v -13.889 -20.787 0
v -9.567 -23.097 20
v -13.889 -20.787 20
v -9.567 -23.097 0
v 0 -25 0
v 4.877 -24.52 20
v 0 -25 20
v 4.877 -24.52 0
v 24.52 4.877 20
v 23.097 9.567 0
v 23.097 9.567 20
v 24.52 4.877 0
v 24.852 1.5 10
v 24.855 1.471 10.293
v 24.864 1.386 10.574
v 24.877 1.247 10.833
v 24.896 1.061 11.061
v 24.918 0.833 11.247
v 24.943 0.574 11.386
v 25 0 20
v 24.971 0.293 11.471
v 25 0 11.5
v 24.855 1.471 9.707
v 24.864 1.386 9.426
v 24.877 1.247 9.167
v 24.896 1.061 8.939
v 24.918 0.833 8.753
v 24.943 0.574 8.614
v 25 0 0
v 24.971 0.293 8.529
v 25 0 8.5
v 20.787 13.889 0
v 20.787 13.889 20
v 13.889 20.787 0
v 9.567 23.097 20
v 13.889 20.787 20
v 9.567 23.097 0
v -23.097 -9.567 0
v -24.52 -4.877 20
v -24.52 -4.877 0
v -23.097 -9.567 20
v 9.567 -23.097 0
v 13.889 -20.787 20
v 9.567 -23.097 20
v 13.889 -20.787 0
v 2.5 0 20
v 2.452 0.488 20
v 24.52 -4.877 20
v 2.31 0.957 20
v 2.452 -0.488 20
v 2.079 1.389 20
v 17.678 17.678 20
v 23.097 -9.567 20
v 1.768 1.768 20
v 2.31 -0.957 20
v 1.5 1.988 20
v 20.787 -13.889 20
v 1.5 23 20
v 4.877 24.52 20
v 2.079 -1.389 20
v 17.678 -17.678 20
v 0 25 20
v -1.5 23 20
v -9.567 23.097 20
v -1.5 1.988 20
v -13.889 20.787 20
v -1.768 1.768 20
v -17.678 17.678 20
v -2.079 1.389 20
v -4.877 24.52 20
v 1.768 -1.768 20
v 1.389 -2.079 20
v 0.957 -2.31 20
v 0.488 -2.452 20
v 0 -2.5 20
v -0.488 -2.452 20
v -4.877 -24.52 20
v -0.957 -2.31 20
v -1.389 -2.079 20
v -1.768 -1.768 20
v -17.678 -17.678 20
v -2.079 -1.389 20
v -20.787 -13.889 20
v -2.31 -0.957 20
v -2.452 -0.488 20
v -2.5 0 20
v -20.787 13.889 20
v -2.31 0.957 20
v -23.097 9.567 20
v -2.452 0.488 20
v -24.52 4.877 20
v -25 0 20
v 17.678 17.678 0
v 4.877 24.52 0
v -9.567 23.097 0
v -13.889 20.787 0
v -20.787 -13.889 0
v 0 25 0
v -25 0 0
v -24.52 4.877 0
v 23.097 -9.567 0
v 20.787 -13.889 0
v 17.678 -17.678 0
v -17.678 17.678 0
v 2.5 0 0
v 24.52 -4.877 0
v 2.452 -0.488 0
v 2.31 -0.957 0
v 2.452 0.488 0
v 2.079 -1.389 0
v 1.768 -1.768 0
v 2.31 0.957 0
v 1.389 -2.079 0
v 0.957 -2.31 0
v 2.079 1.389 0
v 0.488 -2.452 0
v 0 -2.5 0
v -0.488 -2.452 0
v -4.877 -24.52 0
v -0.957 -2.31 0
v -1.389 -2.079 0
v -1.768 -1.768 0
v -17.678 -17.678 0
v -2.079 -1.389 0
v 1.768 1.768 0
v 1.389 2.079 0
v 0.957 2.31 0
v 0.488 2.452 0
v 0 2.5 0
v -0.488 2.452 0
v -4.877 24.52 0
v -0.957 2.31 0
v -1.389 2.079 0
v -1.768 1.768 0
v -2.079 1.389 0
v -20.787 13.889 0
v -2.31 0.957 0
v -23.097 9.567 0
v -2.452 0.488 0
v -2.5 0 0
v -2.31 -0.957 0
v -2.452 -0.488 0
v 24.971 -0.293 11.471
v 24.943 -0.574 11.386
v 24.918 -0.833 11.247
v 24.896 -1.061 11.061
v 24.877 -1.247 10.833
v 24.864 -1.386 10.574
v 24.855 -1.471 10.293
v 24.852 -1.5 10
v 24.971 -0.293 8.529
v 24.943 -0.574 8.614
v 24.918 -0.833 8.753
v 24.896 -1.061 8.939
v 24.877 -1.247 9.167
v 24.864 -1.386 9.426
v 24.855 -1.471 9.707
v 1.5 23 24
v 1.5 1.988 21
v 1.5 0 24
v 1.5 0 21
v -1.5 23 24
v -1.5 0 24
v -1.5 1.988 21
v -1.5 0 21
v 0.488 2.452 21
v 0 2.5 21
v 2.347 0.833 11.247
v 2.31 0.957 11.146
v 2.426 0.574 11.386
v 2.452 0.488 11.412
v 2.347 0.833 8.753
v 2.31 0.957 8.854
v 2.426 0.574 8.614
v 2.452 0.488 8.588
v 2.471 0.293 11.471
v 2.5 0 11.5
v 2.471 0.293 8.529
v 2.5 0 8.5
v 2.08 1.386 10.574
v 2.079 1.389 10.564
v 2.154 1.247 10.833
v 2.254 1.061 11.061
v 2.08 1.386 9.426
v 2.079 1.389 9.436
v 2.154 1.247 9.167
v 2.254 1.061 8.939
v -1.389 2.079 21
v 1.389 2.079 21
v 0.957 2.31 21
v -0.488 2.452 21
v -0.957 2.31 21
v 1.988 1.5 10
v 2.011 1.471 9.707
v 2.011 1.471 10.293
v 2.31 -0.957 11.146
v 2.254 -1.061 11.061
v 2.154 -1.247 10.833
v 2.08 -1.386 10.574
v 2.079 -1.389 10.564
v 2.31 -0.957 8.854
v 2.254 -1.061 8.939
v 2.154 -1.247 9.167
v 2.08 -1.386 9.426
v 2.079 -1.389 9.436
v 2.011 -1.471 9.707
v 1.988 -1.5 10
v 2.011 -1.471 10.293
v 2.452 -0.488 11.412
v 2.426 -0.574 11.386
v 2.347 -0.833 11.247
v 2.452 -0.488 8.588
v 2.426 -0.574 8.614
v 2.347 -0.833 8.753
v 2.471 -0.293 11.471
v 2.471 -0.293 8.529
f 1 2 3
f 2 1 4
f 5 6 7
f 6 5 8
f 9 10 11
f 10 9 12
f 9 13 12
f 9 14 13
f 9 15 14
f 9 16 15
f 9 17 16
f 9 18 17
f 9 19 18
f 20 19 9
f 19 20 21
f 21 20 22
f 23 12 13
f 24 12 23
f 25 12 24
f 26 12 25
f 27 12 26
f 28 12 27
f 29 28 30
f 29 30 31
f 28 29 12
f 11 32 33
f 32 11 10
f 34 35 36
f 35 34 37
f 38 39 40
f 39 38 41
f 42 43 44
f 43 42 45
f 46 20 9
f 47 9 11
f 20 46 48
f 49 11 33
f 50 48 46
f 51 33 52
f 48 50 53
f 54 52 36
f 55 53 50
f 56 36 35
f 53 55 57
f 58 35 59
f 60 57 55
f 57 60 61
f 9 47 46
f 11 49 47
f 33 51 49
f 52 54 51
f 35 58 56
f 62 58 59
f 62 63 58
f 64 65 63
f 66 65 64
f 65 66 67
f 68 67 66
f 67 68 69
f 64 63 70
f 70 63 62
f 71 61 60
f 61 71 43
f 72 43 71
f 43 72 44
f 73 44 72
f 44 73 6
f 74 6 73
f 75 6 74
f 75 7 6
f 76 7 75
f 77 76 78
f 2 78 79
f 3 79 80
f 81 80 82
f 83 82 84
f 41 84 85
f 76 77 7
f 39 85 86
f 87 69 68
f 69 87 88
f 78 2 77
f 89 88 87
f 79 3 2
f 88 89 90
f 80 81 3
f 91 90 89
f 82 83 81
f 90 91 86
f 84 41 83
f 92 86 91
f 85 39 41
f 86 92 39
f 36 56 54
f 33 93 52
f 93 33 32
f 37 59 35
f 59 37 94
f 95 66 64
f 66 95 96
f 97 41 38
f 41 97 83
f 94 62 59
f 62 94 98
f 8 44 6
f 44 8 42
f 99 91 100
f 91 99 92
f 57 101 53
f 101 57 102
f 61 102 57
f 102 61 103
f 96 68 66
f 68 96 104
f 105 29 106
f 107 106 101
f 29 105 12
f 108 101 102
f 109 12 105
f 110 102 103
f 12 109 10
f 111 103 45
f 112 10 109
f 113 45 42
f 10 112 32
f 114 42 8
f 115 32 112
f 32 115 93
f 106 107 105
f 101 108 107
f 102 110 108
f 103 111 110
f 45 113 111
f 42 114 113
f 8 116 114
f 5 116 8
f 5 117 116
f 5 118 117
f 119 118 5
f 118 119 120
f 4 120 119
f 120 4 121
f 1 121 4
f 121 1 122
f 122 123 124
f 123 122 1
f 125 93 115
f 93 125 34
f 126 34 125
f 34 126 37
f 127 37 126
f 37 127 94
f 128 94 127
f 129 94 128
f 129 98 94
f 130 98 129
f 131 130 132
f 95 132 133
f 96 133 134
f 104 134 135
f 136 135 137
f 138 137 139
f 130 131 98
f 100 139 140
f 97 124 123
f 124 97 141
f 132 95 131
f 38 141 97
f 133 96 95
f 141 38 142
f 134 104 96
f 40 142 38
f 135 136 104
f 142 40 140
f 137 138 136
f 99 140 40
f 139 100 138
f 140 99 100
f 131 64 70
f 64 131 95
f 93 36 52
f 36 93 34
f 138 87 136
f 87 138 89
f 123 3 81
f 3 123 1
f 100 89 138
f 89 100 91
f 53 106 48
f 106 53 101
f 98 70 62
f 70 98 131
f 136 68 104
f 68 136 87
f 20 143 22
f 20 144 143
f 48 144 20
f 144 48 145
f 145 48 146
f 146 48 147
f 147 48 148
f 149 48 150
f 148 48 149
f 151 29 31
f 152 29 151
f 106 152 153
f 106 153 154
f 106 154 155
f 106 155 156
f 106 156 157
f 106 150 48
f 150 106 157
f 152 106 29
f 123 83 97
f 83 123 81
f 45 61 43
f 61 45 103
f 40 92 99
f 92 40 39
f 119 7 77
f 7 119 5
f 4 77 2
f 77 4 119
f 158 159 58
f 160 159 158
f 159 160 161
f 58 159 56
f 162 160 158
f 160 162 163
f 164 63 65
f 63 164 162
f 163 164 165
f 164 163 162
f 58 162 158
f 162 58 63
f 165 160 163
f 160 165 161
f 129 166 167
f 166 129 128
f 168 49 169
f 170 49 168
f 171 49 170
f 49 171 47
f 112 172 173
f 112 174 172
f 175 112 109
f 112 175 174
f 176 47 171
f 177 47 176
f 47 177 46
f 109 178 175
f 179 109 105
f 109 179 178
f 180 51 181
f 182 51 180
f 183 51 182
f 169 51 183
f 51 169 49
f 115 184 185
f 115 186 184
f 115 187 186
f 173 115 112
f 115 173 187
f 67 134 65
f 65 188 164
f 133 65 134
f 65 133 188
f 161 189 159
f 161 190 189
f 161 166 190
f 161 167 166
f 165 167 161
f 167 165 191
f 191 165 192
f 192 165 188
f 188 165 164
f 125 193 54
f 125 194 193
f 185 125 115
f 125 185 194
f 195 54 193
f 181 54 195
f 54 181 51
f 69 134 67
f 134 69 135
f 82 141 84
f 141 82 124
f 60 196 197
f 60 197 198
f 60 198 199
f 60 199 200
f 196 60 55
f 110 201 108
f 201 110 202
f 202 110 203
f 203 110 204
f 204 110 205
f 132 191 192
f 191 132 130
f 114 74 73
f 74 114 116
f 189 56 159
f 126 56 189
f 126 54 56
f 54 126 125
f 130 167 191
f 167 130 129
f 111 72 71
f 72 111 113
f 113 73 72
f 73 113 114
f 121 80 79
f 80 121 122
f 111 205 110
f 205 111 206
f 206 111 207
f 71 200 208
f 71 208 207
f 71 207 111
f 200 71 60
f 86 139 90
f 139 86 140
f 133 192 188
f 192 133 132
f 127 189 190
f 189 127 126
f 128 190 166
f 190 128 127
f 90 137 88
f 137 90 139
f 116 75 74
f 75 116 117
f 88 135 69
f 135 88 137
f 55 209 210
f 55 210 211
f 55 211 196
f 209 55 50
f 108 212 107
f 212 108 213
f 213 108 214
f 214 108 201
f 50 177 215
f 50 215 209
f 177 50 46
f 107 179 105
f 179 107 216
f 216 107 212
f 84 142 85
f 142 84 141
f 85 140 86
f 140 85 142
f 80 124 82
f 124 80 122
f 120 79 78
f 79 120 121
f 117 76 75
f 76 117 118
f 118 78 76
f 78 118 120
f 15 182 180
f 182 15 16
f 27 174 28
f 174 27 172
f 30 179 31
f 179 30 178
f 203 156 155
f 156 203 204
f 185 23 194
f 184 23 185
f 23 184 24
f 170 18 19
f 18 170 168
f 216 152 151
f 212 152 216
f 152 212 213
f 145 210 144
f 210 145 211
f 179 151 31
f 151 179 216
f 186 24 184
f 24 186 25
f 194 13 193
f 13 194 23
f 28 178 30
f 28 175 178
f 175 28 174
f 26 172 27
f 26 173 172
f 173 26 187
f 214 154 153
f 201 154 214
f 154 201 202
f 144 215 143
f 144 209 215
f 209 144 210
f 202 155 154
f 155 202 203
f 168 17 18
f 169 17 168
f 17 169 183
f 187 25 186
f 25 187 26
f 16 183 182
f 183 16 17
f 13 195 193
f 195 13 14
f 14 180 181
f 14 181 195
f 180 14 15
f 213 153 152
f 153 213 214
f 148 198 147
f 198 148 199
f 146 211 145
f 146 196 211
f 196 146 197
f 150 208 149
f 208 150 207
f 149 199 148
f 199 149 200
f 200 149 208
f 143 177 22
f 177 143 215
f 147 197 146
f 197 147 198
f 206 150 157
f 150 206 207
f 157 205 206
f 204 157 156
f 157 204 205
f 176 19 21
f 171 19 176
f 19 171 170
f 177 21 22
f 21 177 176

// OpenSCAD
$fn = 32;

// ----------------------------------------------------------------------
// Control knob: pointer knob
// ----------------------------------------------------------------------

// --- parameters (mm) ---
rib_w = 3;                // pointer rib width
rib_h = 5;                // pointer rib height
knob_d = 50;              // knob body diameter
knob_h = 20;              // knob body height
bore_d = 5;               // shaft bore diameter
set_d = 3;                // set screw bore diameter
fit_tol = 0.1;            // tolerance for press fits, mm
free_tol = 0.5;           // tolerance for clearance fits, mm

rib_poke = rib_h - 1;  // rib height above the top
total_h = knob_h + rib_h - 1;  // overall height

difference() {
  union() {
    cylinder(h = knob_h, d = knob_d);
    translate([-rib_w / 2, 0, knob_h - 1])
      cube([rib_w, knob_d / 2 - 2, rib_h]);
  }
  translate([0, 0, -1]) cylinder(h = knob_h + 2, d = bore_d);
  translate([-1, 0, knob_h / 2]) rotate([0, 90, 0])
    cylinder(h = knob_d / 2 + bore_d / 2 + 2, d = set_d);}
